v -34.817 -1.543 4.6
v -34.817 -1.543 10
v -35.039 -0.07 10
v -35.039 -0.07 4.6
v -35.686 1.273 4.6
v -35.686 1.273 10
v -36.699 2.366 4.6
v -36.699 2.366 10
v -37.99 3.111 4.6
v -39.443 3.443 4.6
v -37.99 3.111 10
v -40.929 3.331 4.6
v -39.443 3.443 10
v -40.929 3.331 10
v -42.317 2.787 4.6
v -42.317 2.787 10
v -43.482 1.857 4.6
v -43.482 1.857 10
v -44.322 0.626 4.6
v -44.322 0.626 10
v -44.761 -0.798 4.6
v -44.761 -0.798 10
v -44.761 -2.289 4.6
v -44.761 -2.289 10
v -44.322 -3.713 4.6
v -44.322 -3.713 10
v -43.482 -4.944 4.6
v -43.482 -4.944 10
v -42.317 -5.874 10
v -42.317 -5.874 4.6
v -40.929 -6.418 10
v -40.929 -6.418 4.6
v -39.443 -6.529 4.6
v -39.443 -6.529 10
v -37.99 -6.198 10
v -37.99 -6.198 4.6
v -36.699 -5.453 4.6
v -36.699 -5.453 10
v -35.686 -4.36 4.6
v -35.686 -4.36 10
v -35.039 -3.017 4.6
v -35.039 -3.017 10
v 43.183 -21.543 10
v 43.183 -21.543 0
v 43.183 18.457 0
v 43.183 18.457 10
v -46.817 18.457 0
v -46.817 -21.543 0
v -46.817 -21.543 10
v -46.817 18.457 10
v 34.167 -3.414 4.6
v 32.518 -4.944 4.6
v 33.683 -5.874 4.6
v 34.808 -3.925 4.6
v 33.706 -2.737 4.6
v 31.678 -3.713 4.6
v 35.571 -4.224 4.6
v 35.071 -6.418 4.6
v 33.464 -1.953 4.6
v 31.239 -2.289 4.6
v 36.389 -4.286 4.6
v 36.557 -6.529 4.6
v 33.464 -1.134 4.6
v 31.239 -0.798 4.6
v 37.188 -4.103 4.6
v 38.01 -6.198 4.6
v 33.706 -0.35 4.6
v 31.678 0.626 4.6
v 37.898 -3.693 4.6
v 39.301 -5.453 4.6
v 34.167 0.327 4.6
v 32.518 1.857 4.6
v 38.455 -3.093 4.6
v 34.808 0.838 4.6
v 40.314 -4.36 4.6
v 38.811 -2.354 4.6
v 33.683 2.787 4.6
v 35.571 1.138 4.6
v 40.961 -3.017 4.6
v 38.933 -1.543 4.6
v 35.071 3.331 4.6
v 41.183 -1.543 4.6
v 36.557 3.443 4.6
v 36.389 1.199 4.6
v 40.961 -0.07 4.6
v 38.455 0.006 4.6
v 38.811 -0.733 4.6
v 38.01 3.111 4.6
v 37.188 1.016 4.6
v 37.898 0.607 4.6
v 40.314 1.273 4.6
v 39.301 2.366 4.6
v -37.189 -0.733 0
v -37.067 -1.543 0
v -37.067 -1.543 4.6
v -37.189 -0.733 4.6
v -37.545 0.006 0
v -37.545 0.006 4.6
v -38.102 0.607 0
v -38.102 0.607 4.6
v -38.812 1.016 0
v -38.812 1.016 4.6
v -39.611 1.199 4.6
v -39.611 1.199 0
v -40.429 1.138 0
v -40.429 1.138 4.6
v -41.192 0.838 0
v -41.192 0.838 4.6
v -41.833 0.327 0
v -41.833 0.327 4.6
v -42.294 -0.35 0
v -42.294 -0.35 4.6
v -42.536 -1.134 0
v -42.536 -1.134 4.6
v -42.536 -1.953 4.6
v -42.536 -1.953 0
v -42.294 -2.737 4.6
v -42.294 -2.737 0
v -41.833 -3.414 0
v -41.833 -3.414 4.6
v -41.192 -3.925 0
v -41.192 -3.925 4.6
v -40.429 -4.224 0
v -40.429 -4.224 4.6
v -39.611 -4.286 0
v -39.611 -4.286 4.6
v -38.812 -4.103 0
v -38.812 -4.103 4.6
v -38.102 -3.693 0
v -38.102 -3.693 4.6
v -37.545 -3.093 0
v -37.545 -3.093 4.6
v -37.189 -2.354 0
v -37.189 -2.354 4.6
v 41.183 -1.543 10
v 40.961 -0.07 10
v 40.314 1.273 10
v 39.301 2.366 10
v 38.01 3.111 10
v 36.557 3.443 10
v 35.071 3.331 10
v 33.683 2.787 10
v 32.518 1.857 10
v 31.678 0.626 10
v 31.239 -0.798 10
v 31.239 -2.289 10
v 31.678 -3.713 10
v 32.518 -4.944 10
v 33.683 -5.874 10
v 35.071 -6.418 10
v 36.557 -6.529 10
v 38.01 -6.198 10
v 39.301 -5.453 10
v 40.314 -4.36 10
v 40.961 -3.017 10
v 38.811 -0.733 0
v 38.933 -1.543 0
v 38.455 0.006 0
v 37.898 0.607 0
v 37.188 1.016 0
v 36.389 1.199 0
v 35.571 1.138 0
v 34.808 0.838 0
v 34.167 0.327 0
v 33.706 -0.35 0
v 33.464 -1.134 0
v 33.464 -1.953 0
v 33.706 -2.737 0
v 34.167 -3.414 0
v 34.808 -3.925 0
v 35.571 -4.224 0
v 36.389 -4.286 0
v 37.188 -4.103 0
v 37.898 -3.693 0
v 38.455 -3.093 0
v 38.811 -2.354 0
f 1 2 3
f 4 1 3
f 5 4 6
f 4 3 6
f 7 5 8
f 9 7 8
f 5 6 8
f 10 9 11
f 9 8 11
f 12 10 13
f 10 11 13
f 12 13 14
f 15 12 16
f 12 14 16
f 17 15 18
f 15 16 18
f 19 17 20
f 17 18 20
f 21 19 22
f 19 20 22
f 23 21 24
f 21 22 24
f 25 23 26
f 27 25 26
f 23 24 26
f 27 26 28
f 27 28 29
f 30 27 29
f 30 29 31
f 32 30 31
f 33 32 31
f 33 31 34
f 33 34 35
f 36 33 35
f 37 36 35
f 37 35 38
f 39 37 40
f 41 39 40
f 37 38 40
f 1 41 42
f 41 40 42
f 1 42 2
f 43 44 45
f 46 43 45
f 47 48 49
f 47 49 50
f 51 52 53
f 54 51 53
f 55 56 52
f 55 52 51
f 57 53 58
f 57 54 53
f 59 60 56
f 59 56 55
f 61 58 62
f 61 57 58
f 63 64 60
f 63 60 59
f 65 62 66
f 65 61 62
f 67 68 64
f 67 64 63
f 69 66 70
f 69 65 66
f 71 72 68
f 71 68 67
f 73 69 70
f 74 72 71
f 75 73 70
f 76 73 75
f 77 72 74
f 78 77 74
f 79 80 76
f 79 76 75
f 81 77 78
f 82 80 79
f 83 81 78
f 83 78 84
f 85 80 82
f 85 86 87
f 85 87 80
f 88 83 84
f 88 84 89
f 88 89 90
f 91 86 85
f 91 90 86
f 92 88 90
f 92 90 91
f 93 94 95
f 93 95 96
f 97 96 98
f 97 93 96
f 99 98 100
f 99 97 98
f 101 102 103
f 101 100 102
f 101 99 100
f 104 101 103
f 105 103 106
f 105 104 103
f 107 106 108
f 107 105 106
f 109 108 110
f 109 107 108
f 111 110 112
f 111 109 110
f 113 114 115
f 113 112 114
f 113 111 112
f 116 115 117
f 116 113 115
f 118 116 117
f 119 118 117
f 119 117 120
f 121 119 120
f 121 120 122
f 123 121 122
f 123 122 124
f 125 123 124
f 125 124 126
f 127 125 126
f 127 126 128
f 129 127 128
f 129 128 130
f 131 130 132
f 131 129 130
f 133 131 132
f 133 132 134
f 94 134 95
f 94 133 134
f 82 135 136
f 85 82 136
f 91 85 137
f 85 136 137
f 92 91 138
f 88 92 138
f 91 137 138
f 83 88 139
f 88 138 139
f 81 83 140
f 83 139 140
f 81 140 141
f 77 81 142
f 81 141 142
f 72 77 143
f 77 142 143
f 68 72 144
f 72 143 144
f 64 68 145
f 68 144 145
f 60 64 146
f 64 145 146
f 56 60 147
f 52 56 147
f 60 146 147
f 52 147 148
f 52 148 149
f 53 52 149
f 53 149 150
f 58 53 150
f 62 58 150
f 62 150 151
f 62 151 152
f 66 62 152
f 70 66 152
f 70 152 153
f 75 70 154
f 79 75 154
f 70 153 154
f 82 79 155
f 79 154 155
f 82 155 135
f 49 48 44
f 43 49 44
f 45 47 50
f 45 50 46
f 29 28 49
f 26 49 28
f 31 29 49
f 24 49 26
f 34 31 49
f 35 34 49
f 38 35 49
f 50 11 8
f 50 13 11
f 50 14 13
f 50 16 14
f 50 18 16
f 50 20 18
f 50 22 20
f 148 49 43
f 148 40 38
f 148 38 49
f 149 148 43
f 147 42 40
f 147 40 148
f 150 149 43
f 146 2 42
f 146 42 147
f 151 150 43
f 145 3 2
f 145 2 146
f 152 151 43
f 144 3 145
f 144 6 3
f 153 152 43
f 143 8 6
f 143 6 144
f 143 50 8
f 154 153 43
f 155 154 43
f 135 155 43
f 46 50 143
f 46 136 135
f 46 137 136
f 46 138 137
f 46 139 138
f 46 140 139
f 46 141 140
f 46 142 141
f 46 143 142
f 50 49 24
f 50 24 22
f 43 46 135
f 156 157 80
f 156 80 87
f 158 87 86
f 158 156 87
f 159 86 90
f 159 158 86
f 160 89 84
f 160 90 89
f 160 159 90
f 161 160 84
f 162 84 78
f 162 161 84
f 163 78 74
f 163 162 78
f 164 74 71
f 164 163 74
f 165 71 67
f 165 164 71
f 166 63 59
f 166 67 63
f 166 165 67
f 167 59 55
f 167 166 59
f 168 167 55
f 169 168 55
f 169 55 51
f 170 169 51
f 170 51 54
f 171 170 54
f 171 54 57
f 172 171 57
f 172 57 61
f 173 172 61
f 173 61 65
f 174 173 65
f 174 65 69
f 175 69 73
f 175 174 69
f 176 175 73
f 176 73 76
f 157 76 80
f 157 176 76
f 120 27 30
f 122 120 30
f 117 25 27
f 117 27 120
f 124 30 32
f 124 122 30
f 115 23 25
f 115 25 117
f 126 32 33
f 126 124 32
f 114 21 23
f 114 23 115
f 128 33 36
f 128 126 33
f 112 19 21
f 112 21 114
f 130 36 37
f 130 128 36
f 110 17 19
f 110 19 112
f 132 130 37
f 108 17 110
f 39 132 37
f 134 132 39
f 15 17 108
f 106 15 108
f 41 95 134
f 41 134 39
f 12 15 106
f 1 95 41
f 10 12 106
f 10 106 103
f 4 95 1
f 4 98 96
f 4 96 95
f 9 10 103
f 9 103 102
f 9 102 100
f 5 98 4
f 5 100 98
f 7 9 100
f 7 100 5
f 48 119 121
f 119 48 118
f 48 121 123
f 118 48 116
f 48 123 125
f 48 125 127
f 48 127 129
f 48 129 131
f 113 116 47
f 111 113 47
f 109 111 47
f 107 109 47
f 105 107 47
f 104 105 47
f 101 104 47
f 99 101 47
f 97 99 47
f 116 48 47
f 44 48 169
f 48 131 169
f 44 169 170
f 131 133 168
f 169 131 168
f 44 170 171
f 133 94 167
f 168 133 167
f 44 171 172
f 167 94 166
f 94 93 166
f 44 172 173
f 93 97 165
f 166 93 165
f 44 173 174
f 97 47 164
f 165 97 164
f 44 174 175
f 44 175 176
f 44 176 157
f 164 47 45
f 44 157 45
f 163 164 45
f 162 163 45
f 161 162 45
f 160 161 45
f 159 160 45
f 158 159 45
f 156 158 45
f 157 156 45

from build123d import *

# Parameters (mm, degrees)
SKETCH1_W               = 90
SKETCH1_H               = 40
BOSS_EXTRUDE1_DEPTH     = 10
CUT_EXTRUDE1_DEPTH      = 67
CUT_EXTRUDE1_DEPTH_BACK = 33
SKETCH2_R               = 2.75
CUT_EXTRUDE2_DEPTH      = 56
CUT_EXTRUDE2_DEPTH_BACK = 35
SKETCH2_4_R             = 2.75
SKETCH2_5_R             = 5
CUT_EXTRUDE3_DEPTH      = 5.4
SKETCH2_6_R             = 5
CUT_EXTRUDE4_DEPTH      = 5.4


with BuildPart() as part:
    # Sketch1 → Boss-Extrude1 (new body)
    with BuildSketch(Plane.XY):
        with Locations((-1.816720257, -1.54340836)):
            Rectangle(SKETCH1_W, SKETCH1_H)
    extrude(amount=BOSS_EXTRUDE1_DEPTH)

    # Sketch2 → Cut-Extrude1 (cut, two sides: drawn at the far end of the back side and taken through both)
    with BuildSketch(Plane.XY.offset(10).offset(-CUT_EXTRUDE1_DEPTH_BACK)):
        with Locations((-39.816720257, -1.54340836)):
            Circle(SKETCH2_R)
    extrude(amount=CUT_EXTRUDE1_DEPTH + CUT_EXTRUDE1_DEPTH_BACK, mode=Mode.SUBTRACT)

    # Sketch2<4> → Cut-Extrude2 (cut, two sides: drawn at the far end of the back side and taken through both)
    with BuildSketch(Plane.XY.offset(10).offset(-CUT_EXTRUDE2_DEPTH_BACK)):
        with Locations((36.183279743, -1.54340836)):
            Circle(SKETCH2_4_R)
    extrude(amount=CUT_EXTRUDE2_DEPTH + CUT_EXTRUDE2_DEPTH_BACK, mode=Mode.SUBTRACT)

    # Sketch2<5> → Cut-Extrude3 (cut)
    with BuildSketch(Plane.XY.offset(10)):
        with Locations((-39.816720257, -1.54340836)):
            Circle(SKETCH2_5_R)
    extrude(amount=-CUT_EXTRUDE3_DEPTH, mode=Mode.SUBTRACT)

    # Sketch2<6> → Cut-Extrude4 (cut)
    with BuildSketch(Plane.XY.offset(10)):
        with Locations((36.183279743, -1.54340836)):
            Circle(SKETCH2_6_R)
    extrude(amount=-CUT_EXTRUDE4_DEPTH, mode=Mode.SUBTRACT)


solid = part.part
